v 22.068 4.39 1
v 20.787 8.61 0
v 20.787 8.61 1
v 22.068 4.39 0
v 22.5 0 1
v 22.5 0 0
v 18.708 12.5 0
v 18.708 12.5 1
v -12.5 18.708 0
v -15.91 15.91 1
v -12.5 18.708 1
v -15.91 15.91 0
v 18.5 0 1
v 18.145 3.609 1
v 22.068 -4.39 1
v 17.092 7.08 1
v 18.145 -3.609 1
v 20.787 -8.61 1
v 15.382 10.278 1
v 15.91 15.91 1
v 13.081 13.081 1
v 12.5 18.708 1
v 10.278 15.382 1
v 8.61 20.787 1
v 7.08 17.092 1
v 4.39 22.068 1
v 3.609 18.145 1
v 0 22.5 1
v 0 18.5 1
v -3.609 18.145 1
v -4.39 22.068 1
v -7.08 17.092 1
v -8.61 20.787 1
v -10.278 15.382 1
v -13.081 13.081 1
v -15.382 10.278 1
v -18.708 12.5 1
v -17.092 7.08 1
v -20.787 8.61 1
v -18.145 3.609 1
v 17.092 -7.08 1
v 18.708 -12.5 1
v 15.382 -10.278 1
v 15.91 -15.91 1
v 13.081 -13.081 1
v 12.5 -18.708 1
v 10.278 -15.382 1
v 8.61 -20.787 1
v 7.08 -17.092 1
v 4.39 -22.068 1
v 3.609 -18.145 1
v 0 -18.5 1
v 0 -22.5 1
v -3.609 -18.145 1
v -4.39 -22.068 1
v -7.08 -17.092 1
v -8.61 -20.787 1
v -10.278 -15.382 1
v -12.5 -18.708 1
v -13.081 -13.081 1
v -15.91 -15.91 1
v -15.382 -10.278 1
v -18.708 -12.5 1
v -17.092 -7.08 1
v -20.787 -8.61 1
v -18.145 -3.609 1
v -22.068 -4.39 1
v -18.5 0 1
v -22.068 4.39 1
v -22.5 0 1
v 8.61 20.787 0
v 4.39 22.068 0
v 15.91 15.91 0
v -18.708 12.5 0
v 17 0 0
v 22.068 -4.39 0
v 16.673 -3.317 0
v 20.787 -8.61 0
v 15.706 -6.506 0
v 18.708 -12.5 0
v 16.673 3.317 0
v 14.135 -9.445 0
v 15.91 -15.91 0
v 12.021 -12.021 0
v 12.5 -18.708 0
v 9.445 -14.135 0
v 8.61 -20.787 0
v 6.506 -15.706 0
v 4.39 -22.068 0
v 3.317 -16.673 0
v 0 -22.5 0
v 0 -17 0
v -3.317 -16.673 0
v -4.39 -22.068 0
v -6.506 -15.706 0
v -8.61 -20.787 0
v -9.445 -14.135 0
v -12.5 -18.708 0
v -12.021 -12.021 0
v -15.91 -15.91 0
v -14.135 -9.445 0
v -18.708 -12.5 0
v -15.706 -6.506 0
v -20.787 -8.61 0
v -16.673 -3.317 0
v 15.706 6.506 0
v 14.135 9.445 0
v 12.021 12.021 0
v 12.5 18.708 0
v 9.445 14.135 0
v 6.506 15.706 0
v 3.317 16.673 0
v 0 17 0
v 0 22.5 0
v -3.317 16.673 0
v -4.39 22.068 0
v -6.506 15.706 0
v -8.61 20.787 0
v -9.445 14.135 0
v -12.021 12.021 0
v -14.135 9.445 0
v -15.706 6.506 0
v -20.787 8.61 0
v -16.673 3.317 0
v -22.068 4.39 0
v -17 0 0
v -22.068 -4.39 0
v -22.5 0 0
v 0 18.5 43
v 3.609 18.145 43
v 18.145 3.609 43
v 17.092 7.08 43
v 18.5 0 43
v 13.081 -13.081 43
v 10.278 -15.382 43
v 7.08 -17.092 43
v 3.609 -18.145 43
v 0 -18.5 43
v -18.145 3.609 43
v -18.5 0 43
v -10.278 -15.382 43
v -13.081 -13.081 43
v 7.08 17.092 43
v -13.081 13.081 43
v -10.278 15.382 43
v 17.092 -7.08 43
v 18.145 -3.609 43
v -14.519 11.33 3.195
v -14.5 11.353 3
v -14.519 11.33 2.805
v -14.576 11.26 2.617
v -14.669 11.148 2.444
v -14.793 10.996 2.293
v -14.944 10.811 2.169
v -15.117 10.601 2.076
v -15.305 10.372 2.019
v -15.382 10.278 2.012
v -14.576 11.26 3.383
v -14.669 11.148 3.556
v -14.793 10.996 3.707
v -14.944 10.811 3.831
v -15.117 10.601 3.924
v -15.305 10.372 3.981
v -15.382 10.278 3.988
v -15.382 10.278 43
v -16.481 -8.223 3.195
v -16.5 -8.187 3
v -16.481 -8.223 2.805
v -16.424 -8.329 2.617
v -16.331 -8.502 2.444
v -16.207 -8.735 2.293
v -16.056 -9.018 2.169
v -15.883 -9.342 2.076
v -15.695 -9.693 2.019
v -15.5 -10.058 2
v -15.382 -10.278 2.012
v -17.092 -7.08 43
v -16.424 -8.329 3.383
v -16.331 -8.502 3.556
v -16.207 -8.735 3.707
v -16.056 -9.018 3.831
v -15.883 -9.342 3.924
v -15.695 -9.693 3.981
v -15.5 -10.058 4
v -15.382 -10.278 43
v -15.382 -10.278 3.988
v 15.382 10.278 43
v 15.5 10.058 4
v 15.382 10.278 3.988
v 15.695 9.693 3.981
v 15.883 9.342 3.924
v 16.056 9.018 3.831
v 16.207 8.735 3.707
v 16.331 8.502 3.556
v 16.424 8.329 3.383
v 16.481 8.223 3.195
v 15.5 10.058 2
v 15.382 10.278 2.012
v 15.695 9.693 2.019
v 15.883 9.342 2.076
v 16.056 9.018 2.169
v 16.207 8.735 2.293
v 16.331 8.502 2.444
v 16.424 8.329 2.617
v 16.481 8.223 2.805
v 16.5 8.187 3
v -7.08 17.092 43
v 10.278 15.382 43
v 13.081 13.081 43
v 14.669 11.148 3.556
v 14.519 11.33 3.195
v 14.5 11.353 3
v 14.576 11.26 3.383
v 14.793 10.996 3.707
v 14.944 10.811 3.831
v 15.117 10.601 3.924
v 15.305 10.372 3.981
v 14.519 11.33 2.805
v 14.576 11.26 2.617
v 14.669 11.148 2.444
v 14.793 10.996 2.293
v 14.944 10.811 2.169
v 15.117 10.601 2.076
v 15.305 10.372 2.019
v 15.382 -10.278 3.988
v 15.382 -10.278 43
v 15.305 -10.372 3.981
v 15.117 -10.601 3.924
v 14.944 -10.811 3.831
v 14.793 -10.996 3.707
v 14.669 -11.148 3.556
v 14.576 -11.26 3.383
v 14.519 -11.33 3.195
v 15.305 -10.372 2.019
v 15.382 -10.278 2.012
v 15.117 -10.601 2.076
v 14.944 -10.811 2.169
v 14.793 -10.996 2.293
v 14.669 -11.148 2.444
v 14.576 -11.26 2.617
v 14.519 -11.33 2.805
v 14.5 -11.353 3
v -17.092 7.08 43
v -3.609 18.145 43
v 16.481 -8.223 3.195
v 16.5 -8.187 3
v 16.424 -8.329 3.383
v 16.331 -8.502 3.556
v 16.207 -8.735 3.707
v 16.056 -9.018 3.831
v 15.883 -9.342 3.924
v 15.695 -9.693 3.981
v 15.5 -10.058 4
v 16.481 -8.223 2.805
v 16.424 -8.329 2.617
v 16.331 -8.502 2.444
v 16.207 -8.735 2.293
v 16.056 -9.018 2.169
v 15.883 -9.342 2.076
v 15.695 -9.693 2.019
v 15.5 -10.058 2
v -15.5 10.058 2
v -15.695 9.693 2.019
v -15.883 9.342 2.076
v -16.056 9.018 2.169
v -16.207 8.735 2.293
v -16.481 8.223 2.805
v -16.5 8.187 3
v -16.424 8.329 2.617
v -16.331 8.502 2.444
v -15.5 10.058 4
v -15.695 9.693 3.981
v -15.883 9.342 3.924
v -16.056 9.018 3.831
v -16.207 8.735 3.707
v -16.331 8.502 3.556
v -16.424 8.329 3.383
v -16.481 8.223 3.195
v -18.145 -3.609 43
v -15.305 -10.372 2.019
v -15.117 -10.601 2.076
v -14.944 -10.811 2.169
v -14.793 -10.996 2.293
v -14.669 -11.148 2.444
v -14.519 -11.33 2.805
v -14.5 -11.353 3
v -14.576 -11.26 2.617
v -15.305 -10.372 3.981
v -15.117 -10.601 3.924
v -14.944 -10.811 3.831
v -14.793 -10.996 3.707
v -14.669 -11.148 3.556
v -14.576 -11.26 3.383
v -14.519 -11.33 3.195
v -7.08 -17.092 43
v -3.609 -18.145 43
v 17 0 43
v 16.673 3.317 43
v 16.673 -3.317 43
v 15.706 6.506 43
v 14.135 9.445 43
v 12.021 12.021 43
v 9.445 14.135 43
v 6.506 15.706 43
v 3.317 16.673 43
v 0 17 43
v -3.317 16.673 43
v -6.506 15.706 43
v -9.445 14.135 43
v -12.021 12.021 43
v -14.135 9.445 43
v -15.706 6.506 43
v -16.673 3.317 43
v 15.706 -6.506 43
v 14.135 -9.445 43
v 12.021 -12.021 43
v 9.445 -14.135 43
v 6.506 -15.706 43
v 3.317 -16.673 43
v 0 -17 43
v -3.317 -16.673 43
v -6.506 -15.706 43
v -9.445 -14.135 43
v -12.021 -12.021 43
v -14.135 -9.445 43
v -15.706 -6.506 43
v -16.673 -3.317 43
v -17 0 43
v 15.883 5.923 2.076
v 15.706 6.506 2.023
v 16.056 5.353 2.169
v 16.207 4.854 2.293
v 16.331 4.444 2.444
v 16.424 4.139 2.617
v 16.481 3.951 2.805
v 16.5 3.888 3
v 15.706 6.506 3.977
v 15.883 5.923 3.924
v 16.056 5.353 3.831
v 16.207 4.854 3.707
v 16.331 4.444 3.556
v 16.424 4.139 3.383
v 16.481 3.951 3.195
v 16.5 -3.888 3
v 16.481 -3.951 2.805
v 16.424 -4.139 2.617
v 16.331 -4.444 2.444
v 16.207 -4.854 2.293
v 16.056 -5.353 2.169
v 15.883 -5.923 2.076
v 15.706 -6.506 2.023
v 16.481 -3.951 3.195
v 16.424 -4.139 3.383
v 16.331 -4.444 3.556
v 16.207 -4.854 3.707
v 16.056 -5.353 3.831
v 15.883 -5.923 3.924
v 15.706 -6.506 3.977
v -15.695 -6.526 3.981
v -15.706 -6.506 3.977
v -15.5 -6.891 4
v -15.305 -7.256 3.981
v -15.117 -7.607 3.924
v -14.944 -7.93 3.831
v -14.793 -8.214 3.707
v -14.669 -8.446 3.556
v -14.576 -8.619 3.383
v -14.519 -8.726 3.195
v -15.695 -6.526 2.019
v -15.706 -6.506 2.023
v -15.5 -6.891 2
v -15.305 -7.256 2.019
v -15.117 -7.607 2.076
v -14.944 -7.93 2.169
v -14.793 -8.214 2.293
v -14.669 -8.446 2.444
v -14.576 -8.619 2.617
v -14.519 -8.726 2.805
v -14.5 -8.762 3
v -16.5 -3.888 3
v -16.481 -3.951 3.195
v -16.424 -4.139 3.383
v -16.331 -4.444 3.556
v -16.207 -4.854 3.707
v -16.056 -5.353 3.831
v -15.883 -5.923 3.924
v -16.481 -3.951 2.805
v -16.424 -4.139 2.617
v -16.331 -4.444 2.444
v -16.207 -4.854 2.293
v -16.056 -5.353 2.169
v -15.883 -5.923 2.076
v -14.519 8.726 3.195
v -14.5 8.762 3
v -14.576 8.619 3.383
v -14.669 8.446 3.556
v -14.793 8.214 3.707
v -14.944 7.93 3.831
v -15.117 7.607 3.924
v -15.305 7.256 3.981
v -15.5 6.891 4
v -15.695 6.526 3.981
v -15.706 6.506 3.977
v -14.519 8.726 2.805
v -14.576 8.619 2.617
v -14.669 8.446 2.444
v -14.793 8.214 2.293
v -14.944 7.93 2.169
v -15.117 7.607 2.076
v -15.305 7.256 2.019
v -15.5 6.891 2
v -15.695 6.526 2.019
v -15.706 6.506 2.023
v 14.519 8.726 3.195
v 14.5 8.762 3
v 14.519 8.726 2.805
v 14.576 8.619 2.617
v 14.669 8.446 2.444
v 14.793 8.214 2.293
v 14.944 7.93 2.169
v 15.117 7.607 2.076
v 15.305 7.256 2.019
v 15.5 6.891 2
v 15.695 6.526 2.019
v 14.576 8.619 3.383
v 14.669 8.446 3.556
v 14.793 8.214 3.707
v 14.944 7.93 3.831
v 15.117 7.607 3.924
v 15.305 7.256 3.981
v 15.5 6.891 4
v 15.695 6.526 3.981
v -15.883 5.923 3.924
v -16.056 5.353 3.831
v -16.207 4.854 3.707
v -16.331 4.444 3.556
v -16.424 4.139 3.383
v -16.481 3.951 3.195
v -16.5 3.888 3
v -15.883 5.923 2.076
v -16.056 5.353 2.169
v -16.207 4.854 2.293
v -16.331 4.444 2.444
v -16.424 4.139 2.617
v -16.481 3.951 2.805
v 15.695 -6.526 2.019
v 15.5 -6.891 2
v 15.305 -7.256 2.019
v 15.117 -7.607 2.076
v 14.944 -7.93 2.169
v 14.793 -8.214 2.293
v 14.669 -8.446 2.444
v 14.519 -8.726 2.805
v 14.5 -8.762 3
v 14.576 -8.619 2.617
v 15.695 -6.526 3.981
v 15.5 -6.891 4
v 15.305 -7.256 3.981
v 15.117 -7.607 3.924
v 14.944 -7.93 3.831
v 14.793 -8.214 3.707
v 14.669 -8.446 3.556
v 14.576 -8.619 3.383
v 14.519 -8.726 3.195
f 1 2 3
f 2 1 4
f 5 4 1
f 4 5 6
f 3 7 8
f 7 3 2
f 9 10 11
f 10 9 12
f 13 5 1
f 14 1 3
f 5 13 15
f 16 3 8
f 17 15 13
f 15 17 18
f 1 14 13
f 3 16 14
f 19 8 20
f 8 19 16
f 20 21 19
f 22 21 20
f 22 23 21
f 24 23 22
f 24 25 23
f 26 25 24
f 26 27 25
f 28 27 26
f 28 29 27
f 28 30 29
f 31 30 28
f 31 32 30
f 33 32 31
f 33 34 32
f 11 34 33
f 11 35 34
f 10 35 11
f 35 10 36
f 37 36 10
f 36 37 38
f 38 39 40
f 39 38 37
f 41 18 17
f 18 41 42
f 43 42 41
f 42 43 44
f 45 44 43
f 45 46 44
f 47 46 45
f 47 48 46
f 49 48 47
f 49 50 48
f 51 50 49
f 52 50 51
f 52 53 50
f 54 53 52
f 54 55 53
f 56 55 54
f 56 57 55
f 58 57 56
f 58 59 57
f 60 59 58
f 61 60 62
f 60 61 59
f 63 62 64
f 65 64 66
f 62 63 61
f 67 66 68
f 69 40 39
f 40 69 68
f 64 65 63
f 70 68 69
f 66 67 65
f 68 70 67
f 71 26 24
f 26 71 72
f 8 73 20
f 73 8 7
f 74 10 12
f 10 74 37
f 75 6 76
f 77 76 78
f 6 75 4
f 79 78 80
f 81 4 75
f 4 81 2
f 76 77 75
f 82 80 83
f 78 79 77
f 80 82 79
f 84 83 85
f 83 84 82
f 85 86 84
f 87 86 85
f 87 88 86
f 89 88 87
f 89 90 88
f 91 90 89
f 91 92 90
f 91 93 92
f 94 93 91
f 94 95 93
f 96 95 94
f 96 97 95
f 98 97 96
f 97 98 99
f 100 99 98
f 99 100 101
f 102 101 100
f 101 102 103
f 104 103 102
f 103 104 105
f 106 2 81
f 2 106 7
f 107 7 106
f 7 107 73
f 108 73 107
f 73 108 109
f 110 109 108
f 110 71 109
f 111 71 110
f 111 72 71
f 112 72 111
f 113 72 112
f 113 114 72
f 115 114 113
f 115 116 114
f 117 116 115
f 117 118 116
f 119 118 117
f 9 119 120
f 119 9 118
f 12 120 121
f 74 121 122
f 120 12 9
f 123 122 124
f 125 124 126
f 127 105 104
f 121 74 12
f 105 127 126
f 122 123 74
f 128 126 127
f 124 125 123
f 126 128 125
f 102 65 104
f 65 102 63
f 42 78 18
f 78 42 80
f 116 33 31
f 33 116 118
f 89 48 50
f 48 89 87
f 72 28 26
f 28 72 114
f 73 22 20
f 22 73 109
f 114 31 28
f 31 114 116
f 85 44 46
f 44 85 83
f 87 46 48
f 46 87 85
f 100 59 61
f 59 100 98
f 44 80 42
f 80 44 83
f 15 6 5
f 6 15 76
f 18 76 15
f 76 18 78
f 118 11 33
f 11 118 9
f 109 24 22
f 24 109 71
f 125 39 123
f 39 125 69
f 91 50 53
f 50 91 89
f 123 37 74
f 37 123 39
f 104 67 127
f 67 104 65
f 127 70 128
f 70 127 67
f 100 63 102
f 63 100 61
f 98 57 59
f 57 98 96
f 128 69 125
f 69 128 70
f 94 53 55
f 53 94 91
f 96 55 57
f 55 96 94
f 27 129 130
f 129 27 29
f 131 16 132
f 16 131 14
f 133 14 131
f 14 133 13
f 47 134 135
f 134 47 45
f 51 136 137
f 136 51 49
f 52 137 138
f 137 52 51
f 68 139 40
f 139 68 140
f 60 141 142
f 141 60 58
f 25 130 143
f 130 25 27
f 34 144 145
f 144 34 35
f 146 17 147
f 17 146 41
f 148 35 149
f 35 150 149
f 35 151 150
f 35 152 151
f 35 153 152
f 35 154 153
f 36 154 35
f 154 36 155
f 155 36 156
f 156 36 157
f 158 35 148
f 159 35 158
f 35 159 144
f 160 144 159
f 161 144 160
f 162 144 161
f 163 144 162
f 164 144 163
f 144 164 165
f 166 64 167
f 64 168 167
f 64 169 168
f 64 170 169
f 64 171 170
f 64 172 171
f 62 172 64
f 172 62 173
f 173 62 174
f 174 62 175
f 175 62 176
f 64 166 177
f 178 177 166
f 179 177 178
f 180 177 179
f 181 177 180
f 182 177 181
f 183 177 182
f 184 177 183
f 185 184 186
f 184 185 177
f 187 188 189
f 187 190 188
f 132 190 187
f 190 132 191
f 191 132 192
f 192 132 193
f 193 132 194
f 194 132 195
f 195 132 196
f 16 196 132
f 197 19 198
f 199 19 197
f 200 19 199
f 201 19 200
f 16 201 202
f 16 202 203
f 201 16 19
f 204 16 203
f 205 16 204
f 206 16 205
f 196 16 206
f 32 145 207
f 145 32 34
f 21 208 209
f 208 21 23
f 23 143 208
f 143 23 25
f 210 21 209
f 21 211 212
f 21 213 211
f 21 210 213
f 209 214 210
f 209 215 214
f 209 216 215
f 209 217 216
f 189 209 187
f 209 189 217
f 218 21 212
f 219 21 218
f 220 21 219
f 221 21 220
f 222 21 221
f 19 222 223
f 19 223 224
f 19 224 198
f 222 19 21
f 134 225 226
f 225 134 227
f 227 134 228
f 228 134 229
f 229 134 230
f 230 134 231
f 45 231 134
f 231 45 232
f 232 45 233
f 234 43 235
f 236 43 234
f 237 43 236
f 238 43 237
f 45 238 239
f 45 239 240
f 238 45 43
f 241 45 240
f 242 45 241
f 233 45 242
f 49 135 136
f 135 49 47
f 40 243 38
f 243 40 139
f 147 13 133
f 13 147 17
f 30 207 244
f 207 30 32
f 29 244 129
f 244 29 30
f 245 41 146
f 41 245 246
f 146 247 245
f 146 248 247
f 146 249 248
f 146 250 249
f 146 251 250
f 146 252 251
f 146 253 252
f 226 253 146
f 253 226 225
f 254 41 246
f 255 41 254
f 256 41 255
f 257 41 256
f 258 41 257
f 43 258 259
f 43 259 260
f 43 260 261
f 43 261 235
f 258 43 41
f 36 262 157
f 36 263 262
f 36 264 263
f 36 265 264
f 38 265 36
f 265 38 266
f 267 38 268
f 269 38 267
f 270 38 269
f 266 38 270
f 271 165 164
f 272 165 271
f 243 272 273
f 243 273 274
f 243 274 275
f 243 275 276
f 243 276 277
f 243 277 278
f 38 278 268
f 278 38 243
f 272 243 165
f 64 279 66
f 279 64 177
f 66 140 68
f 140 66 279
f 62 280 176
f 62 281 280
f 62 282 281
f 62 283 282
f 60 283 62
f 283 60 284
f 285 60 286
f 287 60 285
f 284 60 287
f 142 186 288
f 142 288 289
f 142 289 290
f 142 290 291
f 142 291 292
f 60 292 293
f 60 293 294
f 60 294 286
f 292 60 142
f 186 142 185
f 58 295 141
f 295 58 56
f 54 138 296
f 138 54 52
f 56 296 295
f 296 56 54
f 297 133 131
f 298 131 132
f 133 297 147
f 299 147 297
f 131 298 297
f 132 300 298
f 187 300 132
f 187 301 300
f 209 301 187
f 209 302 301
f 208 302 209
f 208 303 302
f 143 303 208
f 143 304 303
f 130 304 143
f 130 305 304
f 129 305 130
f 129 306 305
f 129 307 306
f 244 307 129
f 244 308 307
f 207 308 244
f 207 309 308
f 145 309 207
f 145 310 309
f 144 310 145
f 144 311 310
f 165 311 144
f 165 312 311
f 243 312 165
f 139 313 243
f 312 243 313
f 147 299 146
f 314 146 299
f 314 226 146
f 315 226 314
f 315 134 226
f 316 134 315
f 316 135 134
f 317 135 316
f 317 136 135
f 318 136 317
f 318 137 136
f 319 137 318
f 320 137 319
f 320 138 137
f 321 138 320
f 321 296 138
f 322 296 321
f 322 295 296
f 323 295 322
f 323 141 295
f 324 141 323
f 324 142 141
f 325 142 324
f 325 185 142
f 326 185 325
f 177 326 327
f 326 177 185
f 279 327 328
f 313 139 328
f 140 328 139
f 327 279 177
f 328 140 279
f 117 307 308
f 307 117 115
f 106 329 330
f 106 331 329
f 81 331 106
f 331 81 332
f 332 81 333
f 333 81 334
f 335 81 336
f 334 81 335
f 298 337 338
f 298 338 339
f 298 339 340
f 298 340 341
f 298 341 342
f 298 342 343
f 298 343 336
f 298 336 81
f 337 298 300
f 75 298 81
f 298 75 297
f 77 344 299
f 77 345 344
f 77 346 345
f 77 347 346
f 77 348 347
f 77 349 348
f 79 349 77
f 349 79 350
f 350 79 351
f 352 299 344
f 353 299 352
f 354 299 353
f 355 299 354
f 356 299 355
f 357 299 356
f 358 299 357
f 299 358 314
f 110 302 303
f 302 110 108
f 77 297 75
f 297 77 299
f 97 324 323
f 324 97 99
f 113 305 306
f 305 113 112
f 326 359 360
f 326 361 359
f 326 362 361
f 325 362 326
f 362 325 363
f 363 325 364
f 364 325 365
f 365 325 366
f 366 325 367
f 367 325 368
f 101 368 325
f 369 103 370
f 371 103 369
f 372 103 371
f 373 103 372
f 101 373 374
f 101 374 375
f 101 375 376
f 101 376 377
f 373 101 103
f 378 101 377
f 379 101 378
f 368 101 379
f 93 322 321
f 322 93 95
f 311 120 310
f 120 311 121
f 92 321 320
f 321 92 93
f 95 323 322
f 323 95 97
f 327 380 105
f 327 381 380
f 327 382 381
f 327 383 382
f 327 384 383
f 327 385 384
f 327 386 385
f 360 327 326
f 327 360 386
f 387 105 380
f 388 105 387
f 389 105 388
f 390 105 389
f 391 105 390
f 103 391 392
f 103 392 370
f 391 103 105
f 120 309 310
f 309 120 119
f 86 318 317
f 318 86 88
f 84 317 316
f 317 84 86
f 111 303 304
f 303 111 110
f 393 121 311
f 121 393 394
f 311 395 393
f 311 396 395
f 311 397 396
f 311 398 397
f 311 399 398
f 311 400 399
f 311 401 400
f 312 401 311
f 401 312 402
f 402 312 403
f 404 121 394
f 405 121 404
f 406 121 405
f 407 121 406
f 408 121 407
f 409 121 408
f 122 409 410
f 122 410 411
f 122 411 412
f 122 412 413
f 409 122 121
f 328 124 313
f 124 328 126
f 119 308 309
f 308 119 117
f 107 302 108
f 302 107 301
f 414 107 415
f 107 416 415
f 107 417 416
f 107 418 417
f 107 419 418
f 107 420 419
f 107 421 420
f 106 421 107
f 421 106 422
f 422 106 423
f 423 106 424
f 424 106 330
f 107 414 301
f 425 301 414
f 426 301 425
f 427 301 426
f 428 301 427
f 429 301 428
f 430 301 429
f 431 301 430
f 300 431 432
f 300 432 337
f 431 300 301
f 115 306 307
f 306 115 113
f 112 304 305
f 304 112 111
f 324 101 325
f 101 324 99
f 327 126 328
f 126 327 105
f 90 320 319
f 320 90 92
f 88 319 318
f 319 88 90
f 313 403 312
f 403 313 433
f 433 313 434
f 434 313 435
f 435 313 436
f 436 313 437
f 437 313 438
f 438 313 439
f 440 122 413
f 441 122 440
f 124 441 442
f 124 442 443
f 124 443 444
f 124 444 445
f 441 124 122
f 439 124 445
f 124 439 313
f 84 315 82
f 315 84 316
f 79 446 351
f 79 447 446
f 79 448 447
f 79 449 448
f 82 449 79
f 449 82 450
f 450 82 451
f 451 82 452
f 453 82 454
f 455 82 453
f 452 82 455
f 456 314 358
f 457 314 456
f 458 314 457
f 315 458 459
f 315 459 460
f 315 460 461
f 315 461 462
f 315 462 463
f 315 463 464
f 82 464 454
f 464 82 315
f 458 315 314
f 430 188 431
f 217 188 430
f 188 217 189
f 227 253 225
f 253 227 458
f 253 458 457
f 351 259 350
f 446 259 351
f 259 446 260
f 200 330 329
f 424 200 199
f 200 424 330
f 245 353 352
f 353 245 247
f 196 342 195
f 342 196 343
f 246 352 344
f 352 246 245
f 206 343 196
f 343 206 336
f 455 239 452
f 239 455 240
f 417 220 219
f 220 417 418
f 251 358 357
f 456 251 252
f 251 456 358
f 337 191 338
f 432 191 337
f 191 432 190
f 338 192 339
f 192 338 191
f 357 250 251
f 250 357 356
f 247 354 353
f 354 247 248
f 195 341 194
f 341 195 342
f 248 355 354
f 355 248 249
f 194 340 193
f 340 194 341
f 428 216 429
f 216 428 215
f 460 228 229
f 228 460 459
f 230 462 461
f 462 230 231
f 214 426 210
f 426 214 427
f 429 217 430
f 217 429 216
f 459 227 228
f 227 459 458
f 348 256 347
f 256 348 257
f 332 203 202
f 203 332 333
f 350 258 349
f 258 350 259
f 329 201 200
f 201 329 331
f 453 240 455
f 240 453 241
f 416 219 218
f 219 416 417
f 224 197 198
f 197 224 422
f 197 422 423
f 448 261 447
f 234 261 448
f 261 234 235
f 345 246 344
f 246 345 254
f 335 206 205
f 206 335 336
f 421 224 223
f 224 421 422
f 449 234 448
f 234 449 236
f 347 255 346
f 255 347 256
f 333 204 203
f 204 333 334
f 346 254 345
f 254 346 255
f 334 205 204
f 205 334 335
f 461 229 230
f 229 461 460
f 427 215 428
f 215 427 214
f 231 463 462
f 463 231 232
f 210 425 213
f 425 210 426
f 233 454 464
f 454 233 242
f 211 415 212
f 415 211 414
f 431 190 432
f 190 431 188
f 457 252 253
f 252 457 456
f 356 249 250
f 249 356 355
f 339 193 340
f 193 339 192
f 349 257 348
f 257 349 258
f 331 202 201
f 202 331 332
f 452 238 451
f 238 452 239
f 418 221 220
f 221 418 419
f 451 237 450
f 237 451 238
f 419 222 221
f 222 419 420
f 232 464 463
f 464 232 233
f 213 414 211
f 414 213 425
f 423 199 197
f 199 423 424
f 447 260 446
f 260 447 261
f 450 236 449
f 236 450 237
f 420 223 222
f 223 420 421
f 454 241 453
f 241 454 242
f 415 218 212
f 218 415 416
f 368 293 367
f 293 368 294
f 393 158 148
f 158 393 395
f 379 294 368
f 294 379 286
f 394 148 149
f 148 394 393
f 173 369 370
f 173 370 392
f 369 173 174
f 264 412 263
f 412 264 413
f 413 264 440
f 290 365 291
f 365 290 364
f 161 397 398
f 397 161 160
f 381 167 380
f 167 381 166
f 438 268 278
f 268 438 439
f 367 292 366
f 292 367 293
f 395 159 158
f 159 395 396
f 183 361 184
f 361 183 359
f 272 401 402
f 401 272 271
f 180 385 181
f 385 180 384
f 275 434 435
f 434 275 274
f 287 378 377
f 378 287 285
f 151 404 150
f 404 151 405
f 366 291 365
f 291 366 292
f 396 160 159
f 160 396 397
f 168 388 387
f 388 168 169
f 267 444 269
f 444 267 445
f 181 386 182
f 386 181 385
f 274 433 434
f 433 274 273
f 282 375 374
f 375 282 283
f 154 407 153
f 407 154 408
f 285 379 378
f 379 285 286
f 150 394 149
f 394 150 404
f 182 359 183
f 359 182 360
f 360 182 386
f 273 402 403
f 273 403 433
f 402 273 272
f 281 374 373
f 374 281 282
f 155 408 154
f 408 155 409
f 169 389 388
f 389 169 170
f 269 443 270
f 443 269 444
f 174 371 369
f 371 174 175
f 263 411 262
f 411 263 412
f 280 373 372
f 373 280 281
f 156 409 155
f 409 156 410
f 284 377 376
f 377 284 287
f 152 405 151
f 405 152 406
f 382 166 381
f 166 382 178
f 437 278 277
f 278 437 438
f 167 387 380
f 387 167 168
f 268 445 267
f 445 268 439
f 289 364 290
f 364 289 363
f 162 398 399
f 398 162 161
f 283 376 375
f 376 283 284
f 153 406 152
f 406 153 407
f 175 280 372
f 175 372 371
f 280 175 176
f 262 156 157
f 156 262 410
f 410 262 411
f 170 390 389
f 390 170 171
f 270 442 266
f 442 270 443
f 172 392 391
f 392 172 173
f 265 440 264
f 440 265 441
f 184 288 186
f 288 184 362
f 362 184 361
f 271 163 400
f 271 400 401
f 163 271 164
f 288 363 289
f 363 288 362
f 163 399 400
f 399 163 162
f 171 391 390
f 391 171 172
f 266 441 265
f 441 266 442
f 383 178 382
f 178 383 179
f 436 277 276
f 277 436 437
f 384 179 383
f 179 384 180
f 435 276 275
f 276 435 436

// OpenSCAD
$fn=32;

dIntCone = 34;
dExtCone = dIntCone + 3;
hCone = 43;


hBico=8;
dIntBico=2.5;
dExtBico=5.1;

dIntAba = dExtCone;
dExtAba = dIntAba + 8;
hAba = 1;



*translate([0,0,hCone-0.1])
    tampa(bicos=1);




difference(){
    cylinder(h=hAba, r=dExtAba/2);
    cylinder(h=hAba, r=dIntAba/2);
}

difference(){
    cylinder(h=hCone, r=dExtCone/2);
    cylinder(h=hCone, r=dIntCone/2);

translate([dExtCone/2-3,25,3])
rotate([90,0,0])
cylinder(h=50,r=1);

translate([-dExtCone/2+3,25,3])
rotate([90,0,0])
cylinder(h=50,r=1);

}







module tampa(bicos=1){
  
    if(bicos==1){
        translate([0,0,dExtCone/2-1.7]){
            bico();
        }
    }
    
    if(bicos==2){
        translate([0,0,0]){
            translate([-5,0,dExtCone/2-3])
            bico();

            translate([5,0,dExtCone/2-3])
            bico();
        }
    }   
        
    difference(){

        sphere(r=dExtCone/2);
        sphere(r=dIntCone/2);
        
        if(bicos==2){
            translate([0,0,0]){
                translate([-5,0,dExtCone/2-5])
                bico(false);

                translate([5,0,dExtCone/2-5])
                bico(false);
            }
        }   
         
        if(bicos==1){
            translate([0,0,0]){
                translate([0,0,dExtCone/2-5])
                bico(false);
            }
        }
        
        translate([-dExtCone/2, -dExtCone/2,-dExtCone/2])
            cube([dExtCone,dExtCone,dExtCone/2]);    
    }
}




module bico(furado=true){
    difference(){
        
        render(){
            cylinder(h=hBico, r=dExtBico/2);
        
            translate([0,0, hBico-2])
            rotate_extrude(convexity = 10)
            translate([1.7, 0, 0])
            circle(r = 1, $fn = 100);
        }
        
        if(furado)
            cylinder(h=hBico, r=dIntBico/2);
    }
}
